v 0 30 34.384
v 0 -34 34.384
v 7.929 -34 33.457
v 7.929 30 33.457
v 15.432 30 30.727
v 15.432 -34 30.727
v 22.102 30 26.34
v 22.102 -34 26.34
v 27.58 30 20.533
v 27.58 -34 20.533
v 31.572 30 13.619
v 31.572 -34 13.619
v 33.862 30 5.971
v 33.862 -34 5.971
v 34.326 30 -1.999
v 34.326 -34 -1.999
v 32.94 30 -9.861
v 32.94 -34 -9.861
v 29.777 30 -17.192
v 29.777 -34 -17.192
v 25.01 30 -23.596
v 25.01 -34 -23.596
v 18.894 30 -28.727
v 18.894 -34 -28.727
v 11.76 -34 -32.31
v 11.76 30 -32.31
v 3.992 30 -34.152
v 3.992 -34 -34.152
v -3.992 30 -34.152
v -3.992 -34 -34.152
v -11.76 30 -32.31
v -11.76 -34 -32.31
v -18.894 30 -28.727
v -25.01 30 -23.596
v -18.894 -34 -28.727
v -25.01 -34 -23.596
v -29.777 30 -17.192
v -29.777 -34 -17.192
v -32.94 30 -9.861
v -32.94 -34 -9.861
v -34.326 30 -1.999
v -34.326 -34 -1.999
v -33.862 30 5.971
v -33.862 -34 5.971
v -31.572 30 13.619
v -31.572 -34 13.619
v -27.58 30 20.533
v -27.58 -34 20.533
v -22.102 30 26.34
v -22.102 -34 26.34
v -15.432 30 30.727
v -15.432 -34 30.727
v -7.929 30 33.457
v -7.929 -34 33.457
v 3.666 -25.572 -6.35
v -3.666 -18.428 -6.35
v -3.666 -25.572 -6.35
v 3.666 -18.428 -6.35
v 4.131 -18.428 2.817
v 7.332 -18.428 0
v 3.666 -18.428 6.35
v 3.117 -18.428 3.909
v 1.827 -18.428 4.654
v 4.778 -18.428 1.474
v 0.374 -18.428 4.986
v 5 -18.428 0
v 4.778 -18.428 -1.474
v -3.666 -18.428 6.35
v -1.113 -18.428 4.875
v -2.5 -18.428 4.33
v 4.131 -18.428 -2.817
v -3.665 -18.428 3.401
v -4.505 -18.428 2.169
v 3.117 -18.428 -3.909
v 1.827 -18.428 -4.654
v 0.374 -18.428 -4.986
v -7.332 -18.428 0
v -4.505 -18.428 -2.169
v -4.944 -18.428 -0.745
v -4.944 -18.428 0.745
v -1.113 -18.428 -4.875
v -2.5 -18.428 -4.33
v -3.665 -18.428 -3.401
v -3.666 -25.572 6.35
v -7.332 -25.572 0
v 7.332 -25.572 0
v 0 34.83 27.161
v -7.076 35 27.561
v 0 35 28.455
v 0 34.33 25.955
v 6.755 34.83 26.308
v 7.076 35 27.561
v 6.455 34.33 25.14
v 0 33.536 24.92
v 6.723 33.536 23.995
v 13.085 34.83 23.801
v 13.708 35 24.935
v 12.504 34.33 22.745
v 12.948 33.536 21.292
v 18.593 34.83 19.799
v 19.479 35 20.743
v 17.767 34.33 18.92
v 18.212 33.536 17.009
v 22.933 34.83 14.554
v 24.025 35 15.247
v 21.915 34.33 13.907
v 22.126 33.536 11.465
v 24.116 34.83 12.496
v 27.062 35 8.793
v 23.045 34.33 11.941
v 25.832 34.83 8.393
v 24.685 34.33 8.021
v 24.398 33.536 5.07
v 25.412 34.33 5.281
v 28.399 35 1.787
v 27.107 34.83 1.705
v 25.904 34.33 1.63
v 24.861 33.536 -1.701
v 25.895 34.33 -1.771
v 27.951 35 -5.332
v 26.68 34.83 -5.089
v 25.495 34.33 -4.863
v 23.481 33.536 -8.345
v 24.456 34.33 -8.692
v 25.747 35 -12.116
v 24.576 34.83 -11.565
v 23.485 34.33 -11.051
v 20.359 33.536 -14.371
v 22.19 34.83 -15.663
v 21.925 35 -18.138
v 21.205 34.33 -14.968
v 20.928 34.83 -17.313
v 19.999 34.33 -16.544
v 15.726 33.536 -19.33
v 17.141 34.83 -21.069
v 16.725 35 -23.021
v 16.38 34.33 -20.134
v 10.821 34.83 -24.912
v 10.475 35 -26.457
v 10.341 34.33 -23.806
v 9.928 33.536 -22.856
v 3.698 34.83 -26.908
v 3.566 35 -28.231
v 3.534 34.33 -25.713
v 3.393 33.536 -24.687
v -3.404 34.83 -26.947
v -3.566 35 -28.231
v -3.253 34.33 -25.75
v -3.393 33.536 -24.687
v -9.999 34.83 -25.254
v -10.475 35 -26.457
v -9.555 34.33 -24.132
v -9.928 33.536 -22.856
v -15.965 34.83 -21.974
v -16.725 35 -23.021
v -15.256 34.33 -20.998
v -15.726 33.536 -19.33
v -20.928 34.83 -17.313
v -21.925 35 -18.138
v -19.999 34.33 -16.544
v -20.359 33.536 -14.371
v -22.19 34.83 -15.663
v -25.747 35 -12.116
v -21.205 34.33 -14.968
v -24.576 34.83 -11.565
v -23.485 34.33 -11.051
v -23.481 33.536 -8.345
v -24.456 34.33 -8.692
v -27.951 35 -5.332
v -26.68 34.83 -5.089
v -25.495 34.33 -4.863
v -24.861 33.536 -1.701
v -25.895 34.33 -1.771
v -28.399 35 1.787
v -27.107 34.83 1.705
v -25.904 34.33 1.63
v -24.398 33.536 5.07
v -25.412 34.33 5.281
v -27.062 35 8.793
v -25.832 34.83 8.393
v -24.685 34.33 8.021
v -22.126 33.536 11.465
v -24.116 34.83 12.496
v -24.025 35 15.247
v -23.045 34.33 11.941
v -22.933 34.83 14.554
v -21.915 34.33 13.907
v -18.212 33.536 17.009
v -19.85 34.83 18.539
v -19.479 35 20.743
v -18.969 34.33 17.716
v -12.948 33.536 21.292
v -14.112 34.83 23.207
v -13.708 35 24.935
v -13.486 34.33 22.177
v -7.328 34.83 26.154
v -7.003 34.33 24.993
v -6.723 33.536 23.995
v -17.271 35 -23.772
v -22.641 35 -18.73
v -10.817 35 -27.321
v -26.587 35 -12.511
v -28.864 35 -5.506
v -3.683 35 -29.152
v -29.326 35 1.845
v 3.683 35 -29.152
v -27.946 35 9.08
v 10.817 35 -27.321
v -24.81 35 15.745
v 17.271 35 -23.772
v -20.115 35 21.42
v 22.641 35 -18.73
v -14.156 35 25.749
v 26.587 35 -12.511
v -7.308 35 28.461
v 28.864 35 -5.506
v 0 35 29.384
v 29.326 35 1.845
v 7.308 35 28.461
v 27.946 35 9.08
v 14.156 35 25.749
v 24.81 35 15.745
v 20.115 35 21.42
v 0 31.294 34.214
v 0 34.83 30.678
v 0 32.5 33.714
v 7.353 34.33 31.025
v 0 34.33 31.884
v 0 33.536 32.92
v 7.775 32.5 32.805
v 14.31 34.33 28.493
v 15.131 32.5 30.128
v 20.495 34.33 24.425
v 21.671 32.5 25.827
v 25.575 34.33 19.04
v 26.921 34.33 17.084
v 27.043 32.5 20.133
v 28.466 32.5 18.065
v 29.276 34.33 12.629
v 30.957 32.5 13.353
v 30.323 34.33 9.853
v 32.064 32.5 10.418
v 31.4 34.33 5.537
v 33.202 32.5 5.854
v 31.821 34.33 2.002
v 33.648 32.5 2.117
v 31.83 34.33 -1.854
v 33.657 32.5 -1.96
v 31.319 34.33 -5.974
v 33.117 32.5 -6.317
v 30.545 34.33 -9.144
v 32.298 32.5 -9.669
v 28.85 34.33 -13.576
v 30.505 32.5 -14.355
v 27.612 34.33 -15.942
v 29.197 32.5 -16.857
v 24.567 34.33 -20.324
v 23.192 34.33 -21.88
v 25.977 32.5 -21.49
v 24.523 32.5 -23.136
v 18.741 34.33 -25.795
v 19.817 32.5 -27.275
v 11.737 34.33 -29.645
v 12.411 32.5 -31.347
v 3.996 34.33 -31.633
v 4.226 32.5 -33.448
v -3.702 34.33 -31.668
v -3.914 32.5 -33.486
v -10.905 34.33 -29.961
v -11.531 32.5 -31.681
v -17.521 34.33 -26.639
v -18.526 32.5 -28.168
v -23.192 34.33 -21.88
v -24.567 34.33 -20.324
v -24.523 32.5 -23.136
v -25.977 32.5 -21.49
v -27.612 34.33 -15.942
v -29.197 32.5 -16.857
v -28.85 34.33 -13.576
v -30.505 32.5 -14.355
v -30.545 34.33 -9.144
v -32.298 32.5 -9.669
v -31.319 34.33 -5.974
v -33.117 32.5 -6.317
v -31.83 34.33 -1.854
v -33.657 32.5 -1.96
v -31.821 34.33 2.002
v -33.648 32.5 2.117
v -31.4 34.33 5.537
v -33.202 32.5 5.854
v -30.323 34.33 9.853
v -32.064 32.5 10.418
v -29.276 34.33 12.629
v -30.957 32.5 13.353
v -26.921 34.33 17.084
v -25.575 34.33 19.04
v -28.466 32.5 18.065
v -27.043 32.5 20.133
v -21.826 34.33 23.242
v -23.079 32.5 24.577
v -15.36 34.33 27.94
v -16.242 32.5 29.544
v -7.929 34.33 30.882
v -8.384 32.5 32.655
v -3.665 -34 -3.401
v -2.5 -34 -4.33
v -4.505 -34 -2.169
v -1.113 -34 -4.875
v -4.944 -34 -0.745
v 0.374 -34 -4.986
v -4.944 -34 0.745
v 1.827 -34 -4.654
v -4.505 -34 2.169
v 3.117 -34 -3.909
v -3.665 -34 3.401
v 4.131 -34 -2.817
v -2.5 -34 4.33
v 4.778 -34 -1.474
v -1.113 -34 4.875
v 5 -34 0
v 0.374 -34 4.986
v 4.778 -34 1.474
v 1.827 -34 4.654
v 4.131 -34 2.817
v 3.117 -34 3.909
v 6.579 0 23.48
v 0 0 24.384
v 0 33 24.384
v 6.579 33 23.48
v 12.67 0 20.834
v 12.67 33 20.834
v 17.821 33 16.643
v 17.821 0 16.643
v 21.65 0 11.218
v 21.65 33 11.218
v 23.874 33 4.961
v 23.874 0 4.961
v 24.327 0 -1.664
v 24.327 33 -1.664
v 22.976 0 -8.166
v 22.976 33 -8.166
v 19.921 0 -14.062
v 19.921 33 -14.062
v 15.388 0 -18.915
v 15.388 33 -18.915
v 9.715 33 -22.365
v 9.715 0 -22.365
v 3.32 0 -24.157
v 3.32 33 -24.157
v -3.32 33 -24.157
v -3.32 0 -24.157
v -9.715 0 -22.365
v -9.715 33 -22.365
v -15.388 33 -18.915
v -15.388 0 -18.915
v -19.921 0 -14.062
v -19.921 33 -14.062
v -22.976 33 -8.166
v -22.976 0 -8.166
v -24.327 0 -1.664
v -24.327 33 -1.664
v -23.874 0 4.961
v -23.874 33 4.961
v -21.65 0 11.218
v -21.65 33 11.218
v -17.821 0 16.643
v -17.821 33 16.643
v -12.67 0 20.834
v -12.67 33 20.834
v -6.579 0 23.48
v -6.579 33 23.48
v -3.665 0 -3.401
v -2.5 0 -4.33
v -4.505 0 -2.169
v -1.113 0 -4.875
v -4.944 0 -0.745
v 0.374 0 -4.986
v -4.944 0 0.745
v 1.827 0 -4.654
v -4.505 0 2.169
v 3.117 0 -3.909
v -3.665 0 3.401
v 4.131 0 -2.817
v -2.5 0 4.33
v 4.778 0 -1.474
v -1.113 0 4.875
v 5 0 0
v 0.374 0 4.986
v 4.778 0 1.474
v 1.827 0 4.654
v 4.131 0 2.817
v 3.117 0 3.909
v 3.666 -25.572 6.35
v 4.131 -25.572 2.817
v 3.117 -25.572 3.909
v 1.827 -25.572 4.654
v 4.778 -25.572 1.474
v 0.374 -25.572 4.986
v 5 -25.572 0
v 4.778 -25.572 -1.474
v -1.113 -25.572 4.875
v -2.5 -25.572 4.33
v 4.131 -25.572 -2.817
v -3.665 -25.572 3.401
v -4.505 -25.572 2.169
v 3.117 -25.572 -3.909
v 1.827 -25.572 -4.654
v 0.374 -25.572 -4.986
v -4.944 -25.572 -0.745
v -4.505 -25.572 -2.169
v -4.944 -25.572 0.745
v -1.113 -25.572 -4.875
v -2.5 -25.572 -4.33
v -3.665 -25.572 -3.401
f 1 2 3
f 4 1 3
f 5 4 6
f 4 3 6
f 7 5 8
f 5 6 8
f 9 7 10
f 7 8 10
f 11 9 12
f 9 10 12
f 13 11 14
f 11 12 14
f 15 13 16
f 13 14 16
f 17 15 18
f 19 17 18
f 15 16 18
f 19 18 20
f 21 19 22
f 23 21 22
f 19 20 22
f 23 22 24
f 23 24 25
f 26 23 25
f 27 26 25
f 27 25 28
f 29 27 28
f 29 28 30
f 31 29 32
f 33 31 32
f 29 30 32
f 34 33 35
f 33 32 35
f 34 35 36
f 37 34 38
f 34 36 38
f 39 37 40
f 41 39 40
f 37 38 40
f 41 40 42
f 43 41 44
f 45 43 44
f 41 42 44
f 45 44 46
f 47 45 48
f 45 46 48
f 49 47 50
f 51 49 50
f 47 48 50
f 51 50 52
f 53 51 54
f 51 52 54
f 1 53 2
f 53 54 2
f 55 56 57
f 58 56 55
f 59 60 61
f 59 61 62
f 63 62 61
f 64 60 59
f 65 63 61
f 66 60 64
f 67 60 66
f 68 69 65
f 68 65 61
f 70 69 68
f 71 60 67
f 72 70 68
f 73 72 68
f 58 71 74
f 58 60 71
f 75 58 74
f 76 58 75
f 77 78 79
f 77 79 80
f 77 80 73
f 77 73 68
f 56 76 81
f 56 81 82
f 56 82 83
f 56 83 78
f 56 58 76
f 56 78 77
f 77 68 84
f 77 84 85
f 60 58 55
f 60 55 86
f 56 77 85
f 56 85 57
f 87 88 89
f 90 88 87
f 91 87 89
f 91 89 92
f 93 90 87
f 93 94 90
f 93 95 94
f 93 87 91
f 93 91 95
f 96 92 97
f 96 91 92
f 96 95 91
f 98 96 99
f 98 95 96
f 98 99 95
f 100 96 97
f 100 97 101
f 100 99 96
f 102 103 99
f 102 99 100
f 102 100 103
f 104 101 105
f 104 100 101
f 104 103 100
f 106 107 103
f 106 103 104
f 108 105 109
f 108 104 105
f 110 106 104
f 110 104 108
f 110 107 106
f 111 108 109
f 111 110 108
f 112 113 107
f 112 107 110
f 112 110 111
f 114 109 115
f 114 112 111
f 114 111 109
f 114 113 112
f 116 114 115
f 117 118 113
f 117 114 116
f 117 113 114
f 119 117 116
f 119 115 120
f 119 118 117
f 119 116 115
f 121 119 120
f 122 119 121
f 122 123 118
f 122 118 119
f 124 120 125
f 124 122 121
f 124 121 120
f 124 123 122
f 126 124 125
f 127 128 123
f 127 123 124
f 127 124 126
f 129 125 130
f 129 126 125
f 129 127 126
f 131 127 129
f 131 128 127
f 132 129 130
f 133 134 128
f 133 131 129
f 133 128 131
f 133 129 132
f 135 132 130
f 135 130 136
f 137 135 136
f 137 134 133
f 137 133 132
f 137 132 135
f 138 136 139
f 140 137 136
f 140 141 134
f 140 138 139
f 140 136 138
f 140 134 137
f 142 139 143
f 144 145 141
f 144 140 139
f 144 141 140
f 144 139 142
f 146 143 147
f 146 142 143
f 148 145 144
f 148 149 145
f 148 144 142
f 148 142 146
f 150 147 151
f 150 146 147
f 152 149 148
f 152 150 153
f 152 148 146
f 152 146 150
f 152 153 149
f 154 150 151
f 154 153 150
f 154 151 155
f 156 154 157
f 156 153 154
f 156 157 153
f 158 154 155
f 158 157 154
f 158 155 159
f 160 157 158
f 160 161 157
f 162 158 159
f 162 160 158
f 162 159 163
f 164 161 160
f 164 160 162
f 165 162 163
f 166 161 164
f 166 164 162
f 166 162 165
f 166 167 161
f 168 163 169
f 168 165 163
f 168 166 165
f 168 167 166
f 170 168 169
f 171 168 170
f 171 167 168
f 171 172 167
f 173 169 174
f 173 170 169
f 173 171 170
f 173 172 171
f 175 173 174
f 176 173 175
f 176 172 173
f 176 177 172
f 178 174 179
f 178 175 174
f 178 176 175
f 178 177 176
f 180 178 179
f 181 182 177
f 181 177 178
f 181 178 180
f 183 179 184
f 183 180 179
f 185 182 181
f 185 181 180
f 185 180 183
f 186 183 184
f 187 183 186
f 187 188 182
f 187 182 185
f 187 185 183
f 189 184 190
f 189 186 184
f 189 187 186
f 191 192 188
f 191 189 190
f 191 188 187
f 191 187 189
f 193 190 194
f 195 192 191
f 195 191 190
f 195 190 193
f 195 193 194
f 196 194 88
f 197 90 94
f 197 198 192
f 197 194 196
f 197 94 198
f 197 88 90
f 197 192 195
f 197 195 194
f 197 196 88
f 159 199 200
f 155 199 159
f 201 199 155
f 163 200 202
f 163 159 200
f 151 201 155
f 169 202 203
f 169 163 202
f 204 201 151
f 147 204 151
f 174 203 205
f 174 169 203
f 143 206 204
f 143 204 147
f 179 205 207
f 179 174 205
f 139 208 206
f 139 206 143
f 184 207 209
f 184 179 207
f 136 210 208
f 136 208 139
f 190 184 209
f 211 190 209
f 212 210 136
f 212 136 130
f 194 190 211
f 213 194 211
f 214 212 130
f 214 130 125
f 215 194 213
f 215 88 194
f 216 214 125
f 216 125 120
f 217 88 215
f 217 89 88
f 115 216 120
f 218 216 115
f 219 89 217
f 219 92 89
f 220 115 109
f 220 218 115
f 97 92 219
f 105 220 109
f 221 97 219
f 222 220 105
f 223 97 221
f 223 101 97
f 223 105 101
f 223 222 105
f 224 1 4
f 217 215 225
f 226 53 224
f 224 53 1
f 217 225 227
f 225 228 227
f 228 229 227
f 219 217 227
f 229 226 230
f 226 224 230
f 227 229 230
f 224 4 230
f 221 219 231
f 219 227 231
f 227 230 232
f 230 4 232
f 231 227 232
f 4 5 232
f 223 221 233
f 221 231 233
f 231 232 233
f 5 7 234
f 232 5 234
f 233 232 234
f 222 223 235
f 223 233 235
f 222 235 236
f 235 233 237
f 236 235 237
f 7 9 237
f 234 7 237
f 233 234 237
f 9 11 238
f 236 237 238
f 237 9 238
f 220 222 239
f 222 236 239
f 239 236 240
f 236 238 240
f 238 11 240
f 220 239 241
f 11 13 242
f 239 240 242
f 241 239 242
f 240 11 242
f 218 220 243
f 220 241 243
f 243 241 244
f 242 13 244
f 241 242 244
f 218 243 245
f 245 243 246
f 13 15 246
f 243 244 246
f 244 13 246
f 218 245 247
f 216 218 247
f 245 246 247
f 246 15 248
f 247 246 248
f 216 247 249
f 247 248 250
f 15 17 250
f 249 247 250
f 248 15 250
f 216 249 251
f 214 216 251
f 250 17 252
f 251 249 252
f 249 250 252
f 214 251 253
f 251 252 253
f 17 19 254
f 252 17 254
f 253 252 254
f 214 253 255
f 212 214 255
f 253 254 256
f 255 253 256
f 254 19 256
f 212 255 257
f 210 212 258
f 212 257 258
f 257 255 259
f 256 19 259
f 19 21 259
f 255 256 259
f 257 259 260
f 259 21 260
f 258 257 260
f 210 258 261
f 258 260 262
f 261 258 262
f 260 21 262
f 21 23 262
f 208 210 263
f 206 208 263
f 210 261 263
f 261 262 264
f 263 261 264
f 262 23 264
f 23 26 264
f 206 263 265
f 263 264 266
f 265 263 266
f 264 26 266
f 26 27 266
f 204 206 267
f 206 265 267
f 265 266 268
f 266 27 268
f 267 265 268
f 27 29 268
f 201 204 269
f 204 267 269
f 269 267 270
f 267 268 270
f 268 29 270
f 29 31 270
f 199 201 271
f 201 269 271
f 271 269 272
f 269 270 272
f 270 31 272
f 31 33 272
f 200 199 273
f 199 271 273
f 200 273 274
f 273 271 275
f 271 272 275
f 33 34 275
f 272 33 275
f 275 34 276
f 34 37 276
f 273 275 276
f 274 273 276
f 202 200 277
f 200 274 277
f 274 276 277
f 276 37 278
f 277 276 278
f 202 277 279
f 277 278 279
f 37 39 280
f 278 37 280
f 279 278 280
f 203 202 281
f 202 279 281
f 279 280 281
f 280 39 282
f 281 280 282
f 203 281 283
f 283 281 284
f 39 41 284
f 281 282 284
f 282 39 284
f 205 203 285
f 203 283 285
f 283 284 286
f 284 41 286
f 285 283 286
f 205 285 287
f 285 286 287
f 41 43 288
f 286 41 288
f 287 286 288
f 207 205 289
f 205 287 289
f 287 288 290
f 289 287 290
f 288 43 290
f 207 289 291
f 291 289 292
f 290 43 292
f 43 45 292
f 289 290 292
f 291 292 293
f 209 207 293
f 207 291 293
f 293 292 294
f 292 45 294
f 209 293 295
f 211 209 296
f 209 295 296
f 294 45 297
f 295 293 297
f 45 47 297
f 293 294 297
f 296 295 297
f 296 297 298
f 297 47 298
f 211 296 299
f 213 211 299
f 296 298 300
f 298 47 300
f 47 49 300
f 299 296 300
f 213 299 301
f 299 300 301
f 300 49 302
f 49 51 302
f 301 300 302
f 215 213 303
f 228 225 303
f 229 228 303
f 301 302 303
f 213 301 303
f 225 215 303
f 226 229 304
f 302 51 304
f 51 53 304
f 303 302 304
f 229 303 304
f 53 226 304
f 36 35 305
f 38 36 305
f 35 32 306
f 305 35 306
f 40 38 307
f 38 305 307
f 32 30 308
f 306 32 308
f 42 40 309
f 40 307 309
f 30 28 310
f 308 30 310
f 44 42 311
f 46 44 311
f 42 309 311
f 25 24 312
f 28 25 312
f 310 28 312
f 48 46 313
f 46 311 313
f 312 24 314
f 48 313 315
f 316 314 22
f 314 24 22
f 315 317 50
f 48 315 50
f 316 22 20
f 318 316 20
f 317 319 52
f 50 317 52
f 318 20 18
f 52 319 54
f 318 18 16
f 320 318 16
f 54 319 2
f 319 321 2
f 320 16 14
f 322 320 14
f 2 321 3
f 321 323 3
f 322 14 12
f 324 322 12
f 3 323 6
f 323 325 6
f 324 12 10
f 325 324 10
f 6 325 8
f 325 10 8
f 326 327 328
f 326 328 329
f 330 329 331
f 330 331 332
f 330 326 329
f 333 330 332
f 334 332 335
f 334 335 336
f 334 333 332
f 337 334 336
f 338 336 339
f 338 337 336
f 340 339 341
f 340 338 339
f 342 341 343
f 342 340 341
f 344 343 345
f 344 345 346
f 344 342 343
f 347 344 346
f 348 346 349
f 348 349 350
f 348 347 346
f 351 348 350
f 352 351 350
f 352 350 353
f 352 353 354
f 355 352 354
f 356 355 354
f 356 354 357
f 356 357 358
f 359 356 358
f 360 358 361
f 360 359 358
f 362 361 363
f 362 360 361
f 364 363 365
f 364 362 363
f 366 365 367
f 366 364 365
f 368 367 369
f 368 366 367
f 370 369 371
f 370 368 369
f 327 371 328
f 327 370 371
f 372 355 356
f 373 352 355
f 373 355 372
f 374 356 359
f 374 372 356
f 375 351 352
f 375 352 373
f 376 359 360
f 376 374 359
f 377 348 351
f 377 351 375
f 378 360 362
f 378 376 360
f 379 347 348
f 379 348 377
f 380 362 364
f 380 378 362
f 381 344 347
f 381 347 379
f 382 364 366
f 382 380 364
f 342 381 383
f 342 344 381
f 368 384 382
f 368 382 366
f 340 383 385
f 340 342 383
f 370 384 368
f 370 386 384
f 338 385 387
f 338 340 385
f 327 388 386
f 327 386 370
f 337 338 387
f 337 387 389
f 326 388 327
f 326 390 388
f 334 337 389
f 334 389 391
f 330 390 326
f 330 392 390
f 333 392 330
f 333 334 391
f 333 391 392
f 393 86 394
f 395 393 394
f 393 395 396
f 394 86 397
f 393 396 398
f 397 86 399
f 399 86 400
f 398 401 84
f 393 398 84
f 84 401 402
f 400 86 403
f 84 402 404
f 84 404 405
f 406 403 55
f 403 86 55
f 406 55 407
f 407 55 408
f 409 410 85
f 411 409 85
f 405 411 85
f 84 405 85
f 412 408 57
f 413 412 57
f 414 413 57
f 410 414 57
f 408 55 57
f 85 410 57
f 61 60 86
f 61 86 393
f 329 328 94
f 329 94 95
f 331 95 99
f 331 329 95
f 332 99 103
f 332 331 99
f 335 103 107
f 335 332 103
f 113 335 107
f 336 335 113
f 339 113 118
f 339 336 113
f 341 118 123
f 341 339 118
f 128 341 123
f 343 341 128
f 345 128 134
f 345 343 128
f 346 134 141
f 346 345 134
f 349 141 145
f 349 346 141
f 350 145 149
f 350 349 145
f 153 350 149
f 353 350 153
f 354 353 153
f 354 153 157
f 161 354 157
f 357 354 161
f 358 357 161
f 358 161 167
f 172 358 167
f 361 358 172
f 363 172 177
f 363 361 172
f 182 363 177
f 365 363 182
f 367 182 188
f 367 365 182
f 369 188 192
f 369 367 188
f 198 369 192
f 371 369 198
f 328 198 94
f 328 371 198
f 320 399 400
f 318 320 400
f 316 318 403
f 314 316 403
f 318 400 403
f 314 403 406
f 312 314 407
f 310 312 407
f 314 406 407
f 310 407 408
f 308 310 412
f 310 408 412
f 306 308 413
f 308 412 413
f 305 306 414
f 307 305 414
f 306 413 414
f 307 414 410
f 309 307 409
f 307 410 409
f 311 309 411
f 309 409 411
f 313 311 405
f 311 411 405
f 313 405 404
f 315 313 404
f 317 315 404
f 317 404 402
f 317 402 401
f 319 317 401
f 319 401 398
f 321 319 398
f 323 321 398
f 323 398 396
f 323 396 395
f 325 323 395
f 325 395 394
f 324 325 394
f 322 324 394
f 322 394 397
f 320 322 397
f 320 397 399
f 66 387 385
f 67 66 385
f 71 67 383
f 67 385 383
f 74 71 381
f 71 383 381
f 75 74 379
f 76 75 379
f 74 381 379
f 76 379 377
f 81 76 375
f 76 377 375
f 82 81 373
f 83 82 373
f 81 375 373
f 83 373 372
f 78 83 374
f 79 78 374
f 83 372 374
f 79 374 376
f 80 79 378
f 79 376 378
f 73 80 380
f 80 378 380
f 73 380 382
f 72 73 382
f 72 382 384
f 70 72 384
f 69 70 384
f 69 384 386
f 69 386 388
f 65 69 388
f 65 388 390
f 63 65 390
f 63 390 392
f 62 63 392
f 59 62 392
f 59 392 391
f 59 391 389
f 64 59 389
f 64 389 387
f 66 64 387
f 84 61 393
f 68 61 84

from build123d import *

# Parameters (mm, degrees)
SKETCH1_R               = 34.384
SKETCH1_R_2             = 24.384
BOSS_EXTRUDE1_DEPTH     = 35
BOSS_EXTRUDE2_START     = -34
SKETCH1_3_R             = 34.384
BOSS_EXTRUDE2_DEPTH     = 34
CHAMFER1_SIZE           = 2
FILLET2_R               = 5
CUT_EXTRUDE1_DEPTH      = 3.571875
CUT_EXTRUDE1_DEPTH_BACK = 3.571875
F_10_0MM_DOWEL_HOLE1_D  = 10


with BuildPart() as part:
    # Sketch1 → Boss-Extrude1 (new body)
    with BuildSketch(Plane(origin=(0, 0, 0), x_dir=(1, 0, 0), z_dir=(0, 1, 0))):
        Circle(SKETCH1_R)
        Circle(SKETCH1_R_2, mode=Mode.SUBTRACT)
    extrude(amount=BOSS_EXTRUDE1_DEPTH)

    # Sketch1<3> → Boss-Extrude2 (add)
    with BuildSketch(Plane(origin=(0, 0, 0), x_dir=(1, 0, 0), z_dir=(0, 1, 0)).offset(BOSS_EXTRUDE2_START)):
        Circle(SKETCH1_3_R)
    extrude(amount=BOSS_EXTRUDE2_DEPTH)

    # Chamfer1
    chamfer1_edges = [part.edges().sort_by_distance(p)[0] for p in [
        (-24.384, 35, 0),
    ]]
    chamfer(chamfer1_edges, length=CHAMFER1_SIZE)

    # Fillet2
    fillet2_edges = [part.edges().sort_by_distance(p)[0] for p in [
        (-34.384, 35, 0),
        (-26.384, 35, 0),
    ]]
    fillet(fillet2_edges, radius=FILLET2_R)

    # Sketch10 → Cut-Extrude1 (cut, two sides: drawn at the far end of the back side and taken through both)
    with BuildSketch(Plane(origin=(0, -22, 0), x_dir=(-1, 0, 0), z_dir=(0, -1, 0)).offset(-CUT_EXTRUDE1_DEPTH_BACK)):
        Polygon((7.332348419, 0), (3.666174209, 6.35), (-3.666174209, 6.35), (-7.332348419, 0), (-3.666174209, -6.35), (3.666174209, -6.35), align=None)
    extrude(amount=CUT_EXTRUDE1_DEPTH + CUT_EXTRUDE1_DEPTH_BACK, mode=Mode.SUBTRACT)

    # Ø10.0mm Dowel Hole1 (through all)
    with Locations(Plane(origin=(0, -34, 0), x_dir=(-1, 0, 0), z_dir=(0, -1, 0))):
        with Locations((0, 0)):
            Hole(F_10_0MM_DOWEL_HOLE1_D / 2)


solid = part.part
